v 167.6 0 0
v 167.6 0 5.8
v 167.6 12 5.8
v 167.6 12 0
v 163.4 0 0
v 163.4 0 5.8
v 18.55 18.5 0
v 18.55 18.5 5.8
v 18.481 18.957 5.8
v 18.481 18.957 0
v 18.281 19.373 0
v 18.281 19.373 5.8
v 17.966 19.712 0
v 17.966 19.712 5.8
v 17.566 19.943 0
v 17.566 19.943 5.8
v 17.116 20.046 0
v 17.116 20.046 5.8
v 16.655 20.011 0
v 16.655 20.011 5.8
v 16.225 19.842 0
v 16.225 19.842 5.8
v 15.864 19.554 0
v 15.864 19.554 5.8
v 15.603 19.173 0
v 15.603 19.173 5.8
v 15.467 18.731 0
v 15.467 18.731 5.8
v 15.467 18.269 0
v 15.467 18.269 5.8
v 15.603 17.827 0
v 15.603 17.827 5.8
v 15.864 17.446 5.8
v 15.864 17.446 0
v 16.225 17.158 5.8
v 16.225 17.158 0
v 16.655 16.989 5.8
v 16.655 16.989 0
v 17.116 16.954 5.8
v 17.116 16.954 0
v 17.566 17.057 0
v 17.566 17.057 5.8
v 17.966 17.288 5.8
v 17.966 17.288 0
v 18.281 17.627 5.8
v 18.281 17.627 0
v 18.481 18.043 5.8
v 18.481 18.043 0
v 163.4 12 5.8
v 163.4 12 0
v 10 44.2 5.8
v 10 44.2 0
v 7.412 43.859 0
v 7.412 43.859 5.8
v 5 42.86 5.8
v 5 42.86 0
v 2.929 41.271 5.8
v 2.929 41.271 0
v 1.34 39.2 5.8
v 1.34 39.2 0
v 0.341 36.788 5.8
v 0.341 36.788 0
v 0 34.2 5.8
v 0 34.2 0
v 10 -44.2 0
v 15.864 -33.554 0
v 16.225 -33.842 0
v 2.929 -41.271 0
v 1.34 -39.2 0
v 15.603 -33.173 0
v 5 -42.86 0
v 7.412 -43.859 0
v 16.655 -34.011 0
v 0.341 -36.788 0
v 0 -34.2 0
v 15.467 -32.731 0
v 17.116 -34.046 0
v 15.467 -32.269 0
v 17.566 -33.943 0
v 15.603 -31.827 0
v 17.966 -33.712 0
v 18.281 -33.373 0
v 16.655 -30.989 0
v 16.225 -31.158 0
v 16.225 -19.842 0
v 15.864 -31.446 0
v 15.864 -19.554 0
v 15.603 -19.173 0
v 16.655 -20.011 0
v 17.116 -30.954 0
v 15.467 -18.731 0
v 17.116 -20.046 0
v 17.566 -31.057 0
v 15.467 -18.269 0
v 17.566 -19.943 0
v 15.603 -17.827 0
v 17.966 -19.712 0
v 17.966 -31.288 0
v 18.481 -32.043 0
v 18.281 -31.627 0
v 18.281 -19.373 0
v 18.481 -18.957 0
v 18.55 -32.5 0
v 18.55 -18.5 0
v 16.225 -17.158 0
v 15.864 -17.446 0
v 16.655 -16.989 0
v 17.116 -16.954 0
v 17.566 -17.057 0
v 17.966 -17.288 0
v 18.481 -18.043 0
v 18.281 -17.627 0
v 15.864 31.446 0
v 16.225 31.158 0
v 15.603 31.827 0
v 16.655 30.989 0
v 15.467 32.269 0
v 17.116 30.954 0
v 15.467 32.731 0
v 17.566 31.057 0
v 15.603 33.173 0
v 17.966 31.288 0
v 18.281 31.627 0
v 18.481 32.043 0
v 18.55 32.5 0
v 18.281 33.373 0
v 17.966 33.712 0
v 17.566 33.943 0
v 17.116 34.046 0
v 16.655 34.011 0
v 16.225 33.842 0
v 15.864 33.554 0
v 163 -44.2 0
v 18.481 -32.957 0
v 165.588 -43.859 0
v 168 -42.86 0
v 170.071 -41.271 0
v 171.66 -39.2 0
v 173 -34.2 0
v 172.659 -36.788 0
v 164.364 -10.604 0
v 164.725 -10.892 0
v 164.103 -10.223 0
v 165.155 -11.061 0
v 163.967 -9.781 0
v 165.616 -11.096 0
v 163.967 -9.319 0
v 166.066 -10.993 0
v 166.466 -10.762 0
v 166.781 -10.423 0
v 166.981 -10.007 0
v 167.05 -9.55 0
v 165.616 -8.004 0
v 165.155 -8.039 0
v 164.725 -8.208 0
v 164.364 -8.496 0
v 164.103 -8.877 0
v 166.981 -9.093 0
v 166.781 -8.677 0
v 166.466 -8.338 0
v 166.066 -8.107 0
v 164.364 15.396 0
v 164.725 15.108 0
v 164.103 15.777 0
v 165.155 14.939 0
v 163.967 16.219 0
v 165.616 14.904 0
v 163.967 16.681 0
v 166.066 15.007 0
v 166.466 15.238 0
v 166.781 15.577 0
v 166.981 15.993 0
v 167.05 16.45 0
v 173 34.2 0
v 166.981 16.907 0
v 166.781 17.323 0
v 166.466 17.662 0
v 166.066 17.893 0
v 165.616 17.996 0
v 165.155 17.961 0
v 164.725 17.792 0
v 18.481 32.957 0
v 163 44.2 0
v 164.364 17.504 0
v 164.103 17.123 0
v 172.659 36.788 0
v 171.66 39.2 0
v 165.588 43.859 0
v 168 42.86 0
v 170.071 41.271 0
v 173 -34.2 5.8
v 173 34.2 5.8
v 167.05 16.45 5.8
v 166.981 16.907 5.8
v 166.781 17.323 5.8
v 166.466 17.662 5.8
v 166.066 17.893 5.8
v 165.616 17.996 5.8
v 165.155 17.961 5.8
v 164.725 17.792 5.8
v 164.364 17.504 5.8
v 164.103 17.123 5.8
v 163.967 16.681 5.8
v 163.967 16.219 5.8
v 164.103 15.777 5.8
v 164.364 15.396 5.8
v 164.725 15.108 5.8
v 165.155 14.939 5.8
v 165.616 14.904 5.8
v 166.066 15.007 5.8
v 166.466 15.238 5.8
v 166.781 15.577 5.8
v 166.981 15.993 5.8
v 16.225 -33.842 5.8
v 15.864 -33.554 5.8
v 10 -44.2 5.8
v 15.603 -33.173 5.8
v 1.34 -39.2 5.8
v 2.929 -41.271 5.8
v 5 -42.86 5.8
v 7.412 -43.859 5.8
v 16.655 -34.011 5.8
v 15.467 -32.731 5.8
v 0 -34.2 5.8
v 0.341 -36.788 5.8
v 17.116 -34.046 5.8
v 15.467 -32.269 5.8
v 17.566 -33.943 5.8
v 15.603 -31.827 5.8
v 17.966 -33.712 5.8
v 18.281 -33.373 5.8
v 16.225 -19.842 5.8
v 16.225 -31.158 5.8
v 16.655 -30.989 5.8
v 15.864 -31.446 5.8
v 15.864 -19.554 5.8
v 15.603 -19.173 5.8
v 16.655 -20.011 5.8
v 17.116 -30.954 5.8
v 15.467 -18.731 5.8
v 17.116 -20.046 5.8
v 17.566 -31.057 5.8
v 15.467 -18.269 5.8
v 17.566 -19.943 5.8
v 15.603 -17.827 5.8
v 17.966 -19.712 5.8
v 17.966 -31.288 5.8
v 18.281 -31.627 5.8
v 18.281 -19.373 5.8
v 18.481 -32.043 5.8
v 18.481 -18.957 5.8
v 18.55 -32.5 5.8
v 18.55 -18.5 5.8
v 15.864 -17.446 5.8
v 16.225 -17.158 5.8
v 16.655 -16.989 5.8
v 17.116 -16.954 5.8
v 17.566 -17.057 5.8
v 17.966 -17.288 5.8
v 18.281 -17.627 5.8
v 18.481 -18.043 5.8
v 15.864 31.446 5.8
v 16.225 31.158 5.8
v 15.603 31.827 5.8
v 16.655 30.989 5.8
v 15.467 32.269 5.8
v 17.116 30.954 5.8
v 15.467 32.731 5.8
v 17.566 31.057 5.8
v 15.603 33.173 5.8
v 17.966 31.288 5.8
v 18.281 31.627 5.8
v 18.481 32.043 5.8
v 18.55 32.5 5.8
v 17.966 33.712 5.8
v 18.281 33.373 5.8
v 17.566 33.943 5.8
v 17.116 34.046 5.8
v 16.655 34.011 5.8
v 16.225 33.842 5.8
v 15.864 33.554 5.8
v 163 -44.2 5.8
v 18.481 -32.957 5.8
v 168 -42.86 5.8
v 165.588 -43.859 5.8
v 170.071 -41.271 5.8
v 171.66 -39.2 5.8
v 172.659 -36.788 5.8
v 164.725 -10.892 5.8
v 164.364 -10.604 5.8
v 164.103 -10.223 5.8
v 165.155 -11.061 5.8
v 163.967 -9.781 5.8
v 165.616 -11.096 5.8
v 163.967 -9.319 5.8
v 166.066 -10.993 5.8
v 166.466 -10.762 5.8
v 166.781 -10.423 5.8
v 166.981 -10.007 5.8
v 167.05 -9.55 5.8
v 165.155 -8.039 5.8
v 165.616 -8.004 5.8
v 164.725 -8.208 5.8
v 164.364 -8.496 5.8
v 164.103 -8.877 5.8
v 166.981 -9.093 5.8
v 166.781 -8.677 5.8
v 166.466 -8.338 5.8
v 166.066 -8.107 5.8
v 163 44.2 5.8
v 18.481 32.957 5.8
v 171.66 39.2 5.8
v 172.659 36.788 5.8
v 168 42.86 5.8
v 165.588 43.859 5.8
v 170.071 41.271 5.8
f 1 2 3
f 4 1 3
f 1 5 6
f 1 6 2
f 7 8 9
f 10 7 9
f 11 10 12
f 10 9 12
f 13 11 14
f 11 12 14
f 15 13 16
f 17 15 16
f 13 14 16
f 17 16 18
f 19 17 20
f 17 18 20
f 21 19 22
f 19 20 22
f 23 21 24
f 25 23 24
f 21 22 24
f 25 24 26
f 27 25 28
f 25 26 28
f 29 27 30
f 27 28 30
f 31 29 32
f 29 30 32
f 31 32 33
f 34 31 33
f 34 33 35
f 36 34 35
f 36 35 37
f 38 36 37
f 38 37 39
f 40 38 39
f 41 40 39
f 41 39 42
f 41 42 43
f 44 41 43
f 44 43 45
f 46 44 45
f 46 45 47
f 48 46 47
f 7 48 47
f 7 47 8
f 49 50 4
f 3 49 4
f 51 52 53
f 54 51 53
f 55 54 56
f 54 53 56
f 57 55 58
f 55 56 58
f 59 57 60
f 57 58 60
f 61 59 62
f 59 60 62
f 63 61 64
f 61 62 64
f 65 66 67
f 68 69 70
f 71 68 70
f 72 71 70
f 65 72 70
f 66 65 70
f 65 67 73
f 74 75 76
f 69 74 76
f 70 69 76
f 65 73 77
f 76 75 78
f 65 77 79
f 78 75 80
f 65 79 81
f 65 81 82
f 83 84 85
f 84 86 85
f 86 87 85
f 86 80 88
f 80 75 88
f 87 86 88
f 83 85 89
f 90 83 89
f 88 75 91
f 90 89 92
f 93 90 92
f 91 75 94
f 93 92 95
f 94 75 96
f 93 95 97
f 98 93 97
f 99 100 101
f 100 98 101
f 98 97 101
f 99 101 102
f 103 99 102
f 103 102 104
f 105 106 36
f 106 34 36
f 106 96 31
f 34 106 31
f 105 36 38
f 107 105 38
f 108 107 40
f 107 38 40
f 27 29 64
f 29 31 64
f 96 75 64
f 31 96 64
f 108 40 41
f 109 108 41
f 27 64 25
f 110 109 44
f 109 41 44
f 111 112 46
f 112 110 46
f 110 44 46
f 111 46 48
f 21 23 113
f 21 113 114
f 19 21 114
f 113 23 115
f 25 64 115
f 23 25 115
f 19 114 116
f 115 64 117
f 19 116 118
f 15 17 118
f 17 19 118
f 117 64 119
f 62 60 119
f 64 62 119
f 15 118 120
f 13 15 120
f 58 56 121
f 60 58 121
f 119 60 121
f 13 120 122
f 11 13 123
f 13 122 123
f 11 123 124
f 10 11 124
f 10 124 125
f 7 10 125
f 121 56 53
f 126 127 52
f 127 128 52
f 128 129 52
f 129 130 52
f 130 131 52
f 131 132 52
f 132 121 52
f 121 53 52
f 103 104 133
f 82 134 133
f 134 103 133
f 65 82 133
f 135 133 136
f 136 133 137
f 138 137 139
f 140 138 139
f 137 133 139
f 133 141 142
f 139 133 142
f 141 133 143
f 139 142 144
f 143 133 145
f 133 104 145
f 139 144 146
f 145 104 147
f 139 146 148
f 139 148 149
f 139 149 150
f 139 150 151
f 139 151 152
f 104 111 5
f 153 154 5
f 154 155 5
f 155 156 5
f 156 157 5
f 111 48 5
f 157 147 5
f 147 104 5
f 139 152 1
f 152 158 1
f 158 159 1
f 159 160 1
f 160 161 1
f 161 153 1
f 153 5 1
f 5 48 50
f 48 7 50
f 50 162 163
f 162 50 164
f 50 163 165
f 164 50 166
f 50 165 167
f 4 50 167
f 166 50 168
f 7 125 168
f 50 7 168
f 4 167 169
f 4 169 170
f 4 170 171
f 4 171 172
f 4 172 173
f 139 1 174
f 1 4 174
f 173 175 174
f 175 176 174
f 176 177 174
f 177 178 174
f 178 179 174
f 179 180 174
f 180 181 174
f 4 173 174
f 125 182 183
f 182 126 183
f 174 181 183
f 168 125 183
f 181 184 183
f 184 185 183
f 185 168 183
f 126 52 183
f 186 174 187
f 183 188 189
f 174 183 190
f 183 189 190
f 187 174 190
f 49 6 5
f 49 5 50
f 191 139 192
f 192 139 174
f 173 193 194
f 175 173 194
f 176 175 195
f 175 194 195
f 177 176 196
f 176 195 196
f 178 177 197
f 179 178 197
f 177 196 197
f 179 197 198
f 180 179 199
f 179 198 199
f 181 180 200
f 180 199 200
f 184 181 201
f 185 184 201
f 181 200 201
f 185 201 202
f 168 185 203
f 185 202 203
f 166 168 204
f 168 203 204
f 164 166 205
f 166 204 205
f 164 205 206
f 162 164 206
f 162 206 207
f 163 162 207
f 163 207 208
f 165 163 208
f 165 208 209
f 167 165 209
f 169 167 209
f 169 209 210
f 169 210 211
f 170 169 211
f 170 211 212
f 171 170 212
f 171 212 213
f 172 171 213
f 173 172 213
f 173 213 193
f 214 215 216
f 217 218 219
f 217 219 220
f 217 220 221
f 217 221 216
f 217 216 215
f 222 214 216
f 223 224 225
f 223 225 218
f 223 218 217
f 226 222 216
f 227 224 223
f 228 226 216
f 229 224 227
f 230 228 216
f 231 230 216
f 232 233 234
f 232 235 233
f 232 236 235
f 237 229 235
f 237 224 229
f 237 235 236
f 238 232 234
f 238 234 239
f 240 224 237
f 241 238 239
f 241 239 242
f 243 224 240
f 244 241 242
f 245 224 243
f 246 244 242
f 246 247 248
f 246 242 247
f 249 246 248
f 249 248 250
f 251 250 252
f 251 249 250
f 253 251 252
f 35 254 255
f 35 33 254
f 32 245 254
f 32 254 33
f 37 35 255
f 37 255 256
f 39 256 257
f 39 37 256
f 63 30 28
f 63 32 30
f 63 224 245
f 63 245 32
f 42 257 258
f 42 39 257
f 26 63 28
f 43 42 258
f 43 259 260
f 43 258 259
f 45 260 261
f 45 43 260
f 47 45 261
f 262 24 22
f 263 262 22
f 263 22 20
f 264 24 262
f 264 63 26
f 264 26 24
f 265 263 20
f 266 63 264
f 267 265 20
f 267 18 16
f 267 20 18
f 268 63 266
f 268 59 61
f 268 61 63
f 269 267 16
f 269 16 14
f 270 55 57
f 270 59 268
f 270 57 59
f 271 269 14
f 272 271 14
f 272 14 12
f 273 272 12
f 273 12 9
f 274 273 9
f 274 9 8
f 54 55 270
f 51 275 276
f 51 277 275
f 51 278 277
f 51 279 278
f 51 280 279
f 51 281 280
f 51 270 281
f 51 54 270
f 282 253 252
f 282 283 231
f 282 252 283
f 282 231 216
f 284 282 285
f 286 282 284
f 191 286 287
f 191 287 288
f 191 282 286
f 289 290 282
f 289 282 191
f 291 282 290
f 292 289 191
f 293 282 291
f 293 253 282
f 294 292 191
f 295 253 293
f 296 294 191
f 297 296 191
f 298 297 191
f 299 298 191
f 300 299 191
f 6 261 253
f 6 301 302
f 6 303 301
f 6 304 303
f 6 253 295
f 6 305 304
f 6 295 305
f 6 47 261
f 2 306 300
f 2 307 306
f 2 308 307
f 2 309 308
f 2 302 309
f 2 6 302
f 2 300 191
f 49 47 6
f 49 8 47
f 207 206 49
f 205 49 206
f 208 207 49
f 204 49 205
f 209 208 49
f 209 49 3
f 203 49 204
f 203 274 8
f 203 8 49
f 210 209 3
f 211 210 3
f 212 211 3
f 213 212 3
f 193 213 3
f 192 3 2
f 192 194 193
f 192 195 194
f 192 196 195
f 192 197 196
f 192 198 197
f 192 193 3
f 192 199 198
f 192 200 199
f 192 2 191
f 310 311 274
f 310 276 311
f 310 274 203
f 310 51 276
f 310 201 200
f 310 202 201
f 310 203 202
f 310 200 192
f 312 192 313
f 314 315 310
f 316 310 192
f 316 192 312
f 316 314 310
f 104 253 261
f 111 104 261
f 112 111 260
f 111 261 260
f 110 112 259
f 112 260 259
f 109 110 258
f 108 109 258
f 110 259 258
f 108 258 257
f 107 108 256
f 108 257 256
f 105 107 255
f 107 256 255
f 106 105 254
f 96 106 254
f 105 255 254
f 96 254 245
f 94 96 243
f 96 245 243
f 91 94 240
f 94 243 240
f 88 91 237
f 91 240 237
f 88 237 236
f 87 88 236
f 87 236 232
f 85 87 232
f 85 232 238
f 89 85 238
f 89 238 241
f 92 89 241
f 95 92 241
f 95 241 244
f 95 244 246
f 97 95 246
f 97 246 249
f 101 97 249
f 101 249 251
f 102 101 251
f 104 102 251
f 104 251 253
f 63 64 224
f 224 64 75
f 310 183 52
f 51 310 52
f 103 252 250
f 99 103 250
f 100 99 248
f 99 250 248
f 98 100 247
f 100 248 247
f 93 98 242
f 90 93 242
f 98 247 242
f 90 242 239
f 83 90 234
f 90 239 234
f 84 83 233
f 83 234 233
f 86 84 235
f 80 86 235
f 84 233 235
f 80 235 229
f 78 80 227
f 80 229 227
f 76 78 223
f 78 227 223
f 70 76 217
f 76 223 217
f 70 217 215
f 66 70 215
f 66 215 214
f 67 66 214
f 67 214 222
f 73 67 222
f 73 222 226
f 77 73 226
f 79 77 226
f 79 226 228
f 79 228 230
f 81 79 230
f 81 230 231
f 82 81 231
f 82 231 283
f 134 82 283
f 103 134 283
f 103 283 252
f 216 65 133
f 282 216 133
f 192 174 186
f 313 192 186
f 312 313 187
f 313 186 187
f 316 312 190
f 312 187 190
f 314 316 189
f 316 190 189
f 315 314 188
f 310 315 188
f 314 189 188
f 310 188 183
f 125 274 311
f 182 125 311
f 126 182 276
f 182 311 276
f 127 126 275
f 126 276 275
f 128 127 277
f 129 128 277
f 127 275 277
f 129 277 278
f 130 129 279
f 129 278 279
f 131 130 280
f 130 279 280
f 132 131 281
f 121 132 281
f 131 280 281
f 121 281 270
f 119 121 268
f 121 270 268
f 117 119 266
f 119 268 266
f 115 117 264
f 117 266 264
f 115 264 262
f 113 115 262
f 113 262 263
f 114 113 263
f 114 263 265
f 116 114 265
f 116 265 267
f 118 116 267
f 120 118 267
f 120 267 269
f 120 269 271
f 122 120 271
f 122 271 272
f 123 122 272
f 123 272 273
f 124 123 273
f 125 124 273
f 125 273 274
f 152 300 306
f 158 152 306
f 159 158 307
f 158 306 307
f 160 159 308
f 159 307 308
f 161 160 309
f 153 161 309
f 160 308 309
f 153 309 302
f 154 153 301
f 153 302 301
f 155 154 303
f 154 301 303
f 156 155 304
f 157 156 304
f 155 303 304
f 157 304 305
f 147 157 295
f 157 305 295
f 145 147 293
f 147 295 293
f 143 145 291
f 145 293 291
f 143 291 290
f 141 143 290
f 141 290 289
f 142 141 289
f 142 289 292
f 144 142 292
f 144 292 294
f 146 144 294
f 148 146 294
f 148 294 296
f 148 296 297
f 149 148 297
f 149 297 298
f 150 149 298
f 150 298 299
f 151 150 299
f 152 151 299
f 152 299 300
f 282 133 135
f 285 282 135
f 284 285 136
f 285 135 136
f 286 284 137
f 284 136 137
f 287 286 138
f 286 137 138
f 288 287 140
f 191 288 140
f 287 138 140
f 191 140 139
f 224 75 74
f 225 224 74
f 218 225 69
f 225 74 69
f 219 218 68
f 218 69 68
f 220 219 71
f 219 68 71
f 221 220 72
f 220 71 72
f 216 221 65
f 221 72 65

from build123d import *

# Parameters (mm, degrees)
BOSS_EXTRUDE1_DEPTH = 5.8
SKETCH3_W           = 4.2
SKETCH3_H           = 12
CUT_EXTRUDE1_DEPTH  = 6.35
SKETCH4_R           = 1.55
CUT_EXTRUDE2_DEPTH  = 6.8
SKETCH5_R           = 1.55
CUT_EXTRUDE3_DEPTH  = 6.8


with BuildPart() as part:
    # Sketch2 → Boss-Extrude1 (new body)
    with BuildSketch(Plane.XY):
        with BuildLine():
            Line((163, 44.2), (10, 44.2))
            ThreePointArc((10, 44.2), (2.928932188, 41.271067812), (0, 34.2))
            Line((0, 34.2), (0, -34.2))
            ThreePointArc((0, -34.2), (2.928932188, -41.271067812), (10, -44.2))
            Line((10, -44.2), (163, -44.2))
            ThreePointArc((163, -44.2), (170.071067812, -41.271067812), (173, -34.2))
            Line((173, -34.2), (173, 34.2))
            ThreePointArc((173, 34.2), (170.071067812, 41.271067812), (163, 44.2))
        make_face()
    extrude(amount=BOSS_EXTRUDE1_DEPTH)

    # Sketch3 → Cut-Extrude1 (cut)
    with BuildSketch(Plane.XY.offset(5.8)):
        with Locations((165.5, 6)):
            Rectangle(SKETCH3_W, SKETCH3_H)
    extrude(amount=-CUT_EXTRUDE1_DEPTH, mode=Mode.SUBTRACT)

    # Sketch4 → Cut-Extrude2 (cut, through all)
    with BuildSketch(Plane.XY.offset(5.8)):
        with Locations((17, 32.5)):
            Circle(SKETCH4_R)
        with Locations((17, 18.5)):
            Circle(SKETCH4_R)
        with Locations((17, -18.5)):
            Circle(SKETCH4_R)
        with Locations((17, -32.5)):
            Circle(SKETCH4_R)
    extrude(amount=-CUT_EXTRUDE2_DEPTH, mode=Mode.SUBTRACT)

    # Sketch5 → Cut-Extrude3 (cut, through all)
    with BuildSketch(Plane.XY.offset(5.8)):
        with Locations((165.5, 16.45)):
            Circle(SKETCH5_R)
        with Locations((165.5, -9.55)):
            Circle(SKETCH5_R)
    extrude(amount=-CUT_EXTRUDE3_DEPTH, mode=Mode.SUBTRACT)


solid = part.part
